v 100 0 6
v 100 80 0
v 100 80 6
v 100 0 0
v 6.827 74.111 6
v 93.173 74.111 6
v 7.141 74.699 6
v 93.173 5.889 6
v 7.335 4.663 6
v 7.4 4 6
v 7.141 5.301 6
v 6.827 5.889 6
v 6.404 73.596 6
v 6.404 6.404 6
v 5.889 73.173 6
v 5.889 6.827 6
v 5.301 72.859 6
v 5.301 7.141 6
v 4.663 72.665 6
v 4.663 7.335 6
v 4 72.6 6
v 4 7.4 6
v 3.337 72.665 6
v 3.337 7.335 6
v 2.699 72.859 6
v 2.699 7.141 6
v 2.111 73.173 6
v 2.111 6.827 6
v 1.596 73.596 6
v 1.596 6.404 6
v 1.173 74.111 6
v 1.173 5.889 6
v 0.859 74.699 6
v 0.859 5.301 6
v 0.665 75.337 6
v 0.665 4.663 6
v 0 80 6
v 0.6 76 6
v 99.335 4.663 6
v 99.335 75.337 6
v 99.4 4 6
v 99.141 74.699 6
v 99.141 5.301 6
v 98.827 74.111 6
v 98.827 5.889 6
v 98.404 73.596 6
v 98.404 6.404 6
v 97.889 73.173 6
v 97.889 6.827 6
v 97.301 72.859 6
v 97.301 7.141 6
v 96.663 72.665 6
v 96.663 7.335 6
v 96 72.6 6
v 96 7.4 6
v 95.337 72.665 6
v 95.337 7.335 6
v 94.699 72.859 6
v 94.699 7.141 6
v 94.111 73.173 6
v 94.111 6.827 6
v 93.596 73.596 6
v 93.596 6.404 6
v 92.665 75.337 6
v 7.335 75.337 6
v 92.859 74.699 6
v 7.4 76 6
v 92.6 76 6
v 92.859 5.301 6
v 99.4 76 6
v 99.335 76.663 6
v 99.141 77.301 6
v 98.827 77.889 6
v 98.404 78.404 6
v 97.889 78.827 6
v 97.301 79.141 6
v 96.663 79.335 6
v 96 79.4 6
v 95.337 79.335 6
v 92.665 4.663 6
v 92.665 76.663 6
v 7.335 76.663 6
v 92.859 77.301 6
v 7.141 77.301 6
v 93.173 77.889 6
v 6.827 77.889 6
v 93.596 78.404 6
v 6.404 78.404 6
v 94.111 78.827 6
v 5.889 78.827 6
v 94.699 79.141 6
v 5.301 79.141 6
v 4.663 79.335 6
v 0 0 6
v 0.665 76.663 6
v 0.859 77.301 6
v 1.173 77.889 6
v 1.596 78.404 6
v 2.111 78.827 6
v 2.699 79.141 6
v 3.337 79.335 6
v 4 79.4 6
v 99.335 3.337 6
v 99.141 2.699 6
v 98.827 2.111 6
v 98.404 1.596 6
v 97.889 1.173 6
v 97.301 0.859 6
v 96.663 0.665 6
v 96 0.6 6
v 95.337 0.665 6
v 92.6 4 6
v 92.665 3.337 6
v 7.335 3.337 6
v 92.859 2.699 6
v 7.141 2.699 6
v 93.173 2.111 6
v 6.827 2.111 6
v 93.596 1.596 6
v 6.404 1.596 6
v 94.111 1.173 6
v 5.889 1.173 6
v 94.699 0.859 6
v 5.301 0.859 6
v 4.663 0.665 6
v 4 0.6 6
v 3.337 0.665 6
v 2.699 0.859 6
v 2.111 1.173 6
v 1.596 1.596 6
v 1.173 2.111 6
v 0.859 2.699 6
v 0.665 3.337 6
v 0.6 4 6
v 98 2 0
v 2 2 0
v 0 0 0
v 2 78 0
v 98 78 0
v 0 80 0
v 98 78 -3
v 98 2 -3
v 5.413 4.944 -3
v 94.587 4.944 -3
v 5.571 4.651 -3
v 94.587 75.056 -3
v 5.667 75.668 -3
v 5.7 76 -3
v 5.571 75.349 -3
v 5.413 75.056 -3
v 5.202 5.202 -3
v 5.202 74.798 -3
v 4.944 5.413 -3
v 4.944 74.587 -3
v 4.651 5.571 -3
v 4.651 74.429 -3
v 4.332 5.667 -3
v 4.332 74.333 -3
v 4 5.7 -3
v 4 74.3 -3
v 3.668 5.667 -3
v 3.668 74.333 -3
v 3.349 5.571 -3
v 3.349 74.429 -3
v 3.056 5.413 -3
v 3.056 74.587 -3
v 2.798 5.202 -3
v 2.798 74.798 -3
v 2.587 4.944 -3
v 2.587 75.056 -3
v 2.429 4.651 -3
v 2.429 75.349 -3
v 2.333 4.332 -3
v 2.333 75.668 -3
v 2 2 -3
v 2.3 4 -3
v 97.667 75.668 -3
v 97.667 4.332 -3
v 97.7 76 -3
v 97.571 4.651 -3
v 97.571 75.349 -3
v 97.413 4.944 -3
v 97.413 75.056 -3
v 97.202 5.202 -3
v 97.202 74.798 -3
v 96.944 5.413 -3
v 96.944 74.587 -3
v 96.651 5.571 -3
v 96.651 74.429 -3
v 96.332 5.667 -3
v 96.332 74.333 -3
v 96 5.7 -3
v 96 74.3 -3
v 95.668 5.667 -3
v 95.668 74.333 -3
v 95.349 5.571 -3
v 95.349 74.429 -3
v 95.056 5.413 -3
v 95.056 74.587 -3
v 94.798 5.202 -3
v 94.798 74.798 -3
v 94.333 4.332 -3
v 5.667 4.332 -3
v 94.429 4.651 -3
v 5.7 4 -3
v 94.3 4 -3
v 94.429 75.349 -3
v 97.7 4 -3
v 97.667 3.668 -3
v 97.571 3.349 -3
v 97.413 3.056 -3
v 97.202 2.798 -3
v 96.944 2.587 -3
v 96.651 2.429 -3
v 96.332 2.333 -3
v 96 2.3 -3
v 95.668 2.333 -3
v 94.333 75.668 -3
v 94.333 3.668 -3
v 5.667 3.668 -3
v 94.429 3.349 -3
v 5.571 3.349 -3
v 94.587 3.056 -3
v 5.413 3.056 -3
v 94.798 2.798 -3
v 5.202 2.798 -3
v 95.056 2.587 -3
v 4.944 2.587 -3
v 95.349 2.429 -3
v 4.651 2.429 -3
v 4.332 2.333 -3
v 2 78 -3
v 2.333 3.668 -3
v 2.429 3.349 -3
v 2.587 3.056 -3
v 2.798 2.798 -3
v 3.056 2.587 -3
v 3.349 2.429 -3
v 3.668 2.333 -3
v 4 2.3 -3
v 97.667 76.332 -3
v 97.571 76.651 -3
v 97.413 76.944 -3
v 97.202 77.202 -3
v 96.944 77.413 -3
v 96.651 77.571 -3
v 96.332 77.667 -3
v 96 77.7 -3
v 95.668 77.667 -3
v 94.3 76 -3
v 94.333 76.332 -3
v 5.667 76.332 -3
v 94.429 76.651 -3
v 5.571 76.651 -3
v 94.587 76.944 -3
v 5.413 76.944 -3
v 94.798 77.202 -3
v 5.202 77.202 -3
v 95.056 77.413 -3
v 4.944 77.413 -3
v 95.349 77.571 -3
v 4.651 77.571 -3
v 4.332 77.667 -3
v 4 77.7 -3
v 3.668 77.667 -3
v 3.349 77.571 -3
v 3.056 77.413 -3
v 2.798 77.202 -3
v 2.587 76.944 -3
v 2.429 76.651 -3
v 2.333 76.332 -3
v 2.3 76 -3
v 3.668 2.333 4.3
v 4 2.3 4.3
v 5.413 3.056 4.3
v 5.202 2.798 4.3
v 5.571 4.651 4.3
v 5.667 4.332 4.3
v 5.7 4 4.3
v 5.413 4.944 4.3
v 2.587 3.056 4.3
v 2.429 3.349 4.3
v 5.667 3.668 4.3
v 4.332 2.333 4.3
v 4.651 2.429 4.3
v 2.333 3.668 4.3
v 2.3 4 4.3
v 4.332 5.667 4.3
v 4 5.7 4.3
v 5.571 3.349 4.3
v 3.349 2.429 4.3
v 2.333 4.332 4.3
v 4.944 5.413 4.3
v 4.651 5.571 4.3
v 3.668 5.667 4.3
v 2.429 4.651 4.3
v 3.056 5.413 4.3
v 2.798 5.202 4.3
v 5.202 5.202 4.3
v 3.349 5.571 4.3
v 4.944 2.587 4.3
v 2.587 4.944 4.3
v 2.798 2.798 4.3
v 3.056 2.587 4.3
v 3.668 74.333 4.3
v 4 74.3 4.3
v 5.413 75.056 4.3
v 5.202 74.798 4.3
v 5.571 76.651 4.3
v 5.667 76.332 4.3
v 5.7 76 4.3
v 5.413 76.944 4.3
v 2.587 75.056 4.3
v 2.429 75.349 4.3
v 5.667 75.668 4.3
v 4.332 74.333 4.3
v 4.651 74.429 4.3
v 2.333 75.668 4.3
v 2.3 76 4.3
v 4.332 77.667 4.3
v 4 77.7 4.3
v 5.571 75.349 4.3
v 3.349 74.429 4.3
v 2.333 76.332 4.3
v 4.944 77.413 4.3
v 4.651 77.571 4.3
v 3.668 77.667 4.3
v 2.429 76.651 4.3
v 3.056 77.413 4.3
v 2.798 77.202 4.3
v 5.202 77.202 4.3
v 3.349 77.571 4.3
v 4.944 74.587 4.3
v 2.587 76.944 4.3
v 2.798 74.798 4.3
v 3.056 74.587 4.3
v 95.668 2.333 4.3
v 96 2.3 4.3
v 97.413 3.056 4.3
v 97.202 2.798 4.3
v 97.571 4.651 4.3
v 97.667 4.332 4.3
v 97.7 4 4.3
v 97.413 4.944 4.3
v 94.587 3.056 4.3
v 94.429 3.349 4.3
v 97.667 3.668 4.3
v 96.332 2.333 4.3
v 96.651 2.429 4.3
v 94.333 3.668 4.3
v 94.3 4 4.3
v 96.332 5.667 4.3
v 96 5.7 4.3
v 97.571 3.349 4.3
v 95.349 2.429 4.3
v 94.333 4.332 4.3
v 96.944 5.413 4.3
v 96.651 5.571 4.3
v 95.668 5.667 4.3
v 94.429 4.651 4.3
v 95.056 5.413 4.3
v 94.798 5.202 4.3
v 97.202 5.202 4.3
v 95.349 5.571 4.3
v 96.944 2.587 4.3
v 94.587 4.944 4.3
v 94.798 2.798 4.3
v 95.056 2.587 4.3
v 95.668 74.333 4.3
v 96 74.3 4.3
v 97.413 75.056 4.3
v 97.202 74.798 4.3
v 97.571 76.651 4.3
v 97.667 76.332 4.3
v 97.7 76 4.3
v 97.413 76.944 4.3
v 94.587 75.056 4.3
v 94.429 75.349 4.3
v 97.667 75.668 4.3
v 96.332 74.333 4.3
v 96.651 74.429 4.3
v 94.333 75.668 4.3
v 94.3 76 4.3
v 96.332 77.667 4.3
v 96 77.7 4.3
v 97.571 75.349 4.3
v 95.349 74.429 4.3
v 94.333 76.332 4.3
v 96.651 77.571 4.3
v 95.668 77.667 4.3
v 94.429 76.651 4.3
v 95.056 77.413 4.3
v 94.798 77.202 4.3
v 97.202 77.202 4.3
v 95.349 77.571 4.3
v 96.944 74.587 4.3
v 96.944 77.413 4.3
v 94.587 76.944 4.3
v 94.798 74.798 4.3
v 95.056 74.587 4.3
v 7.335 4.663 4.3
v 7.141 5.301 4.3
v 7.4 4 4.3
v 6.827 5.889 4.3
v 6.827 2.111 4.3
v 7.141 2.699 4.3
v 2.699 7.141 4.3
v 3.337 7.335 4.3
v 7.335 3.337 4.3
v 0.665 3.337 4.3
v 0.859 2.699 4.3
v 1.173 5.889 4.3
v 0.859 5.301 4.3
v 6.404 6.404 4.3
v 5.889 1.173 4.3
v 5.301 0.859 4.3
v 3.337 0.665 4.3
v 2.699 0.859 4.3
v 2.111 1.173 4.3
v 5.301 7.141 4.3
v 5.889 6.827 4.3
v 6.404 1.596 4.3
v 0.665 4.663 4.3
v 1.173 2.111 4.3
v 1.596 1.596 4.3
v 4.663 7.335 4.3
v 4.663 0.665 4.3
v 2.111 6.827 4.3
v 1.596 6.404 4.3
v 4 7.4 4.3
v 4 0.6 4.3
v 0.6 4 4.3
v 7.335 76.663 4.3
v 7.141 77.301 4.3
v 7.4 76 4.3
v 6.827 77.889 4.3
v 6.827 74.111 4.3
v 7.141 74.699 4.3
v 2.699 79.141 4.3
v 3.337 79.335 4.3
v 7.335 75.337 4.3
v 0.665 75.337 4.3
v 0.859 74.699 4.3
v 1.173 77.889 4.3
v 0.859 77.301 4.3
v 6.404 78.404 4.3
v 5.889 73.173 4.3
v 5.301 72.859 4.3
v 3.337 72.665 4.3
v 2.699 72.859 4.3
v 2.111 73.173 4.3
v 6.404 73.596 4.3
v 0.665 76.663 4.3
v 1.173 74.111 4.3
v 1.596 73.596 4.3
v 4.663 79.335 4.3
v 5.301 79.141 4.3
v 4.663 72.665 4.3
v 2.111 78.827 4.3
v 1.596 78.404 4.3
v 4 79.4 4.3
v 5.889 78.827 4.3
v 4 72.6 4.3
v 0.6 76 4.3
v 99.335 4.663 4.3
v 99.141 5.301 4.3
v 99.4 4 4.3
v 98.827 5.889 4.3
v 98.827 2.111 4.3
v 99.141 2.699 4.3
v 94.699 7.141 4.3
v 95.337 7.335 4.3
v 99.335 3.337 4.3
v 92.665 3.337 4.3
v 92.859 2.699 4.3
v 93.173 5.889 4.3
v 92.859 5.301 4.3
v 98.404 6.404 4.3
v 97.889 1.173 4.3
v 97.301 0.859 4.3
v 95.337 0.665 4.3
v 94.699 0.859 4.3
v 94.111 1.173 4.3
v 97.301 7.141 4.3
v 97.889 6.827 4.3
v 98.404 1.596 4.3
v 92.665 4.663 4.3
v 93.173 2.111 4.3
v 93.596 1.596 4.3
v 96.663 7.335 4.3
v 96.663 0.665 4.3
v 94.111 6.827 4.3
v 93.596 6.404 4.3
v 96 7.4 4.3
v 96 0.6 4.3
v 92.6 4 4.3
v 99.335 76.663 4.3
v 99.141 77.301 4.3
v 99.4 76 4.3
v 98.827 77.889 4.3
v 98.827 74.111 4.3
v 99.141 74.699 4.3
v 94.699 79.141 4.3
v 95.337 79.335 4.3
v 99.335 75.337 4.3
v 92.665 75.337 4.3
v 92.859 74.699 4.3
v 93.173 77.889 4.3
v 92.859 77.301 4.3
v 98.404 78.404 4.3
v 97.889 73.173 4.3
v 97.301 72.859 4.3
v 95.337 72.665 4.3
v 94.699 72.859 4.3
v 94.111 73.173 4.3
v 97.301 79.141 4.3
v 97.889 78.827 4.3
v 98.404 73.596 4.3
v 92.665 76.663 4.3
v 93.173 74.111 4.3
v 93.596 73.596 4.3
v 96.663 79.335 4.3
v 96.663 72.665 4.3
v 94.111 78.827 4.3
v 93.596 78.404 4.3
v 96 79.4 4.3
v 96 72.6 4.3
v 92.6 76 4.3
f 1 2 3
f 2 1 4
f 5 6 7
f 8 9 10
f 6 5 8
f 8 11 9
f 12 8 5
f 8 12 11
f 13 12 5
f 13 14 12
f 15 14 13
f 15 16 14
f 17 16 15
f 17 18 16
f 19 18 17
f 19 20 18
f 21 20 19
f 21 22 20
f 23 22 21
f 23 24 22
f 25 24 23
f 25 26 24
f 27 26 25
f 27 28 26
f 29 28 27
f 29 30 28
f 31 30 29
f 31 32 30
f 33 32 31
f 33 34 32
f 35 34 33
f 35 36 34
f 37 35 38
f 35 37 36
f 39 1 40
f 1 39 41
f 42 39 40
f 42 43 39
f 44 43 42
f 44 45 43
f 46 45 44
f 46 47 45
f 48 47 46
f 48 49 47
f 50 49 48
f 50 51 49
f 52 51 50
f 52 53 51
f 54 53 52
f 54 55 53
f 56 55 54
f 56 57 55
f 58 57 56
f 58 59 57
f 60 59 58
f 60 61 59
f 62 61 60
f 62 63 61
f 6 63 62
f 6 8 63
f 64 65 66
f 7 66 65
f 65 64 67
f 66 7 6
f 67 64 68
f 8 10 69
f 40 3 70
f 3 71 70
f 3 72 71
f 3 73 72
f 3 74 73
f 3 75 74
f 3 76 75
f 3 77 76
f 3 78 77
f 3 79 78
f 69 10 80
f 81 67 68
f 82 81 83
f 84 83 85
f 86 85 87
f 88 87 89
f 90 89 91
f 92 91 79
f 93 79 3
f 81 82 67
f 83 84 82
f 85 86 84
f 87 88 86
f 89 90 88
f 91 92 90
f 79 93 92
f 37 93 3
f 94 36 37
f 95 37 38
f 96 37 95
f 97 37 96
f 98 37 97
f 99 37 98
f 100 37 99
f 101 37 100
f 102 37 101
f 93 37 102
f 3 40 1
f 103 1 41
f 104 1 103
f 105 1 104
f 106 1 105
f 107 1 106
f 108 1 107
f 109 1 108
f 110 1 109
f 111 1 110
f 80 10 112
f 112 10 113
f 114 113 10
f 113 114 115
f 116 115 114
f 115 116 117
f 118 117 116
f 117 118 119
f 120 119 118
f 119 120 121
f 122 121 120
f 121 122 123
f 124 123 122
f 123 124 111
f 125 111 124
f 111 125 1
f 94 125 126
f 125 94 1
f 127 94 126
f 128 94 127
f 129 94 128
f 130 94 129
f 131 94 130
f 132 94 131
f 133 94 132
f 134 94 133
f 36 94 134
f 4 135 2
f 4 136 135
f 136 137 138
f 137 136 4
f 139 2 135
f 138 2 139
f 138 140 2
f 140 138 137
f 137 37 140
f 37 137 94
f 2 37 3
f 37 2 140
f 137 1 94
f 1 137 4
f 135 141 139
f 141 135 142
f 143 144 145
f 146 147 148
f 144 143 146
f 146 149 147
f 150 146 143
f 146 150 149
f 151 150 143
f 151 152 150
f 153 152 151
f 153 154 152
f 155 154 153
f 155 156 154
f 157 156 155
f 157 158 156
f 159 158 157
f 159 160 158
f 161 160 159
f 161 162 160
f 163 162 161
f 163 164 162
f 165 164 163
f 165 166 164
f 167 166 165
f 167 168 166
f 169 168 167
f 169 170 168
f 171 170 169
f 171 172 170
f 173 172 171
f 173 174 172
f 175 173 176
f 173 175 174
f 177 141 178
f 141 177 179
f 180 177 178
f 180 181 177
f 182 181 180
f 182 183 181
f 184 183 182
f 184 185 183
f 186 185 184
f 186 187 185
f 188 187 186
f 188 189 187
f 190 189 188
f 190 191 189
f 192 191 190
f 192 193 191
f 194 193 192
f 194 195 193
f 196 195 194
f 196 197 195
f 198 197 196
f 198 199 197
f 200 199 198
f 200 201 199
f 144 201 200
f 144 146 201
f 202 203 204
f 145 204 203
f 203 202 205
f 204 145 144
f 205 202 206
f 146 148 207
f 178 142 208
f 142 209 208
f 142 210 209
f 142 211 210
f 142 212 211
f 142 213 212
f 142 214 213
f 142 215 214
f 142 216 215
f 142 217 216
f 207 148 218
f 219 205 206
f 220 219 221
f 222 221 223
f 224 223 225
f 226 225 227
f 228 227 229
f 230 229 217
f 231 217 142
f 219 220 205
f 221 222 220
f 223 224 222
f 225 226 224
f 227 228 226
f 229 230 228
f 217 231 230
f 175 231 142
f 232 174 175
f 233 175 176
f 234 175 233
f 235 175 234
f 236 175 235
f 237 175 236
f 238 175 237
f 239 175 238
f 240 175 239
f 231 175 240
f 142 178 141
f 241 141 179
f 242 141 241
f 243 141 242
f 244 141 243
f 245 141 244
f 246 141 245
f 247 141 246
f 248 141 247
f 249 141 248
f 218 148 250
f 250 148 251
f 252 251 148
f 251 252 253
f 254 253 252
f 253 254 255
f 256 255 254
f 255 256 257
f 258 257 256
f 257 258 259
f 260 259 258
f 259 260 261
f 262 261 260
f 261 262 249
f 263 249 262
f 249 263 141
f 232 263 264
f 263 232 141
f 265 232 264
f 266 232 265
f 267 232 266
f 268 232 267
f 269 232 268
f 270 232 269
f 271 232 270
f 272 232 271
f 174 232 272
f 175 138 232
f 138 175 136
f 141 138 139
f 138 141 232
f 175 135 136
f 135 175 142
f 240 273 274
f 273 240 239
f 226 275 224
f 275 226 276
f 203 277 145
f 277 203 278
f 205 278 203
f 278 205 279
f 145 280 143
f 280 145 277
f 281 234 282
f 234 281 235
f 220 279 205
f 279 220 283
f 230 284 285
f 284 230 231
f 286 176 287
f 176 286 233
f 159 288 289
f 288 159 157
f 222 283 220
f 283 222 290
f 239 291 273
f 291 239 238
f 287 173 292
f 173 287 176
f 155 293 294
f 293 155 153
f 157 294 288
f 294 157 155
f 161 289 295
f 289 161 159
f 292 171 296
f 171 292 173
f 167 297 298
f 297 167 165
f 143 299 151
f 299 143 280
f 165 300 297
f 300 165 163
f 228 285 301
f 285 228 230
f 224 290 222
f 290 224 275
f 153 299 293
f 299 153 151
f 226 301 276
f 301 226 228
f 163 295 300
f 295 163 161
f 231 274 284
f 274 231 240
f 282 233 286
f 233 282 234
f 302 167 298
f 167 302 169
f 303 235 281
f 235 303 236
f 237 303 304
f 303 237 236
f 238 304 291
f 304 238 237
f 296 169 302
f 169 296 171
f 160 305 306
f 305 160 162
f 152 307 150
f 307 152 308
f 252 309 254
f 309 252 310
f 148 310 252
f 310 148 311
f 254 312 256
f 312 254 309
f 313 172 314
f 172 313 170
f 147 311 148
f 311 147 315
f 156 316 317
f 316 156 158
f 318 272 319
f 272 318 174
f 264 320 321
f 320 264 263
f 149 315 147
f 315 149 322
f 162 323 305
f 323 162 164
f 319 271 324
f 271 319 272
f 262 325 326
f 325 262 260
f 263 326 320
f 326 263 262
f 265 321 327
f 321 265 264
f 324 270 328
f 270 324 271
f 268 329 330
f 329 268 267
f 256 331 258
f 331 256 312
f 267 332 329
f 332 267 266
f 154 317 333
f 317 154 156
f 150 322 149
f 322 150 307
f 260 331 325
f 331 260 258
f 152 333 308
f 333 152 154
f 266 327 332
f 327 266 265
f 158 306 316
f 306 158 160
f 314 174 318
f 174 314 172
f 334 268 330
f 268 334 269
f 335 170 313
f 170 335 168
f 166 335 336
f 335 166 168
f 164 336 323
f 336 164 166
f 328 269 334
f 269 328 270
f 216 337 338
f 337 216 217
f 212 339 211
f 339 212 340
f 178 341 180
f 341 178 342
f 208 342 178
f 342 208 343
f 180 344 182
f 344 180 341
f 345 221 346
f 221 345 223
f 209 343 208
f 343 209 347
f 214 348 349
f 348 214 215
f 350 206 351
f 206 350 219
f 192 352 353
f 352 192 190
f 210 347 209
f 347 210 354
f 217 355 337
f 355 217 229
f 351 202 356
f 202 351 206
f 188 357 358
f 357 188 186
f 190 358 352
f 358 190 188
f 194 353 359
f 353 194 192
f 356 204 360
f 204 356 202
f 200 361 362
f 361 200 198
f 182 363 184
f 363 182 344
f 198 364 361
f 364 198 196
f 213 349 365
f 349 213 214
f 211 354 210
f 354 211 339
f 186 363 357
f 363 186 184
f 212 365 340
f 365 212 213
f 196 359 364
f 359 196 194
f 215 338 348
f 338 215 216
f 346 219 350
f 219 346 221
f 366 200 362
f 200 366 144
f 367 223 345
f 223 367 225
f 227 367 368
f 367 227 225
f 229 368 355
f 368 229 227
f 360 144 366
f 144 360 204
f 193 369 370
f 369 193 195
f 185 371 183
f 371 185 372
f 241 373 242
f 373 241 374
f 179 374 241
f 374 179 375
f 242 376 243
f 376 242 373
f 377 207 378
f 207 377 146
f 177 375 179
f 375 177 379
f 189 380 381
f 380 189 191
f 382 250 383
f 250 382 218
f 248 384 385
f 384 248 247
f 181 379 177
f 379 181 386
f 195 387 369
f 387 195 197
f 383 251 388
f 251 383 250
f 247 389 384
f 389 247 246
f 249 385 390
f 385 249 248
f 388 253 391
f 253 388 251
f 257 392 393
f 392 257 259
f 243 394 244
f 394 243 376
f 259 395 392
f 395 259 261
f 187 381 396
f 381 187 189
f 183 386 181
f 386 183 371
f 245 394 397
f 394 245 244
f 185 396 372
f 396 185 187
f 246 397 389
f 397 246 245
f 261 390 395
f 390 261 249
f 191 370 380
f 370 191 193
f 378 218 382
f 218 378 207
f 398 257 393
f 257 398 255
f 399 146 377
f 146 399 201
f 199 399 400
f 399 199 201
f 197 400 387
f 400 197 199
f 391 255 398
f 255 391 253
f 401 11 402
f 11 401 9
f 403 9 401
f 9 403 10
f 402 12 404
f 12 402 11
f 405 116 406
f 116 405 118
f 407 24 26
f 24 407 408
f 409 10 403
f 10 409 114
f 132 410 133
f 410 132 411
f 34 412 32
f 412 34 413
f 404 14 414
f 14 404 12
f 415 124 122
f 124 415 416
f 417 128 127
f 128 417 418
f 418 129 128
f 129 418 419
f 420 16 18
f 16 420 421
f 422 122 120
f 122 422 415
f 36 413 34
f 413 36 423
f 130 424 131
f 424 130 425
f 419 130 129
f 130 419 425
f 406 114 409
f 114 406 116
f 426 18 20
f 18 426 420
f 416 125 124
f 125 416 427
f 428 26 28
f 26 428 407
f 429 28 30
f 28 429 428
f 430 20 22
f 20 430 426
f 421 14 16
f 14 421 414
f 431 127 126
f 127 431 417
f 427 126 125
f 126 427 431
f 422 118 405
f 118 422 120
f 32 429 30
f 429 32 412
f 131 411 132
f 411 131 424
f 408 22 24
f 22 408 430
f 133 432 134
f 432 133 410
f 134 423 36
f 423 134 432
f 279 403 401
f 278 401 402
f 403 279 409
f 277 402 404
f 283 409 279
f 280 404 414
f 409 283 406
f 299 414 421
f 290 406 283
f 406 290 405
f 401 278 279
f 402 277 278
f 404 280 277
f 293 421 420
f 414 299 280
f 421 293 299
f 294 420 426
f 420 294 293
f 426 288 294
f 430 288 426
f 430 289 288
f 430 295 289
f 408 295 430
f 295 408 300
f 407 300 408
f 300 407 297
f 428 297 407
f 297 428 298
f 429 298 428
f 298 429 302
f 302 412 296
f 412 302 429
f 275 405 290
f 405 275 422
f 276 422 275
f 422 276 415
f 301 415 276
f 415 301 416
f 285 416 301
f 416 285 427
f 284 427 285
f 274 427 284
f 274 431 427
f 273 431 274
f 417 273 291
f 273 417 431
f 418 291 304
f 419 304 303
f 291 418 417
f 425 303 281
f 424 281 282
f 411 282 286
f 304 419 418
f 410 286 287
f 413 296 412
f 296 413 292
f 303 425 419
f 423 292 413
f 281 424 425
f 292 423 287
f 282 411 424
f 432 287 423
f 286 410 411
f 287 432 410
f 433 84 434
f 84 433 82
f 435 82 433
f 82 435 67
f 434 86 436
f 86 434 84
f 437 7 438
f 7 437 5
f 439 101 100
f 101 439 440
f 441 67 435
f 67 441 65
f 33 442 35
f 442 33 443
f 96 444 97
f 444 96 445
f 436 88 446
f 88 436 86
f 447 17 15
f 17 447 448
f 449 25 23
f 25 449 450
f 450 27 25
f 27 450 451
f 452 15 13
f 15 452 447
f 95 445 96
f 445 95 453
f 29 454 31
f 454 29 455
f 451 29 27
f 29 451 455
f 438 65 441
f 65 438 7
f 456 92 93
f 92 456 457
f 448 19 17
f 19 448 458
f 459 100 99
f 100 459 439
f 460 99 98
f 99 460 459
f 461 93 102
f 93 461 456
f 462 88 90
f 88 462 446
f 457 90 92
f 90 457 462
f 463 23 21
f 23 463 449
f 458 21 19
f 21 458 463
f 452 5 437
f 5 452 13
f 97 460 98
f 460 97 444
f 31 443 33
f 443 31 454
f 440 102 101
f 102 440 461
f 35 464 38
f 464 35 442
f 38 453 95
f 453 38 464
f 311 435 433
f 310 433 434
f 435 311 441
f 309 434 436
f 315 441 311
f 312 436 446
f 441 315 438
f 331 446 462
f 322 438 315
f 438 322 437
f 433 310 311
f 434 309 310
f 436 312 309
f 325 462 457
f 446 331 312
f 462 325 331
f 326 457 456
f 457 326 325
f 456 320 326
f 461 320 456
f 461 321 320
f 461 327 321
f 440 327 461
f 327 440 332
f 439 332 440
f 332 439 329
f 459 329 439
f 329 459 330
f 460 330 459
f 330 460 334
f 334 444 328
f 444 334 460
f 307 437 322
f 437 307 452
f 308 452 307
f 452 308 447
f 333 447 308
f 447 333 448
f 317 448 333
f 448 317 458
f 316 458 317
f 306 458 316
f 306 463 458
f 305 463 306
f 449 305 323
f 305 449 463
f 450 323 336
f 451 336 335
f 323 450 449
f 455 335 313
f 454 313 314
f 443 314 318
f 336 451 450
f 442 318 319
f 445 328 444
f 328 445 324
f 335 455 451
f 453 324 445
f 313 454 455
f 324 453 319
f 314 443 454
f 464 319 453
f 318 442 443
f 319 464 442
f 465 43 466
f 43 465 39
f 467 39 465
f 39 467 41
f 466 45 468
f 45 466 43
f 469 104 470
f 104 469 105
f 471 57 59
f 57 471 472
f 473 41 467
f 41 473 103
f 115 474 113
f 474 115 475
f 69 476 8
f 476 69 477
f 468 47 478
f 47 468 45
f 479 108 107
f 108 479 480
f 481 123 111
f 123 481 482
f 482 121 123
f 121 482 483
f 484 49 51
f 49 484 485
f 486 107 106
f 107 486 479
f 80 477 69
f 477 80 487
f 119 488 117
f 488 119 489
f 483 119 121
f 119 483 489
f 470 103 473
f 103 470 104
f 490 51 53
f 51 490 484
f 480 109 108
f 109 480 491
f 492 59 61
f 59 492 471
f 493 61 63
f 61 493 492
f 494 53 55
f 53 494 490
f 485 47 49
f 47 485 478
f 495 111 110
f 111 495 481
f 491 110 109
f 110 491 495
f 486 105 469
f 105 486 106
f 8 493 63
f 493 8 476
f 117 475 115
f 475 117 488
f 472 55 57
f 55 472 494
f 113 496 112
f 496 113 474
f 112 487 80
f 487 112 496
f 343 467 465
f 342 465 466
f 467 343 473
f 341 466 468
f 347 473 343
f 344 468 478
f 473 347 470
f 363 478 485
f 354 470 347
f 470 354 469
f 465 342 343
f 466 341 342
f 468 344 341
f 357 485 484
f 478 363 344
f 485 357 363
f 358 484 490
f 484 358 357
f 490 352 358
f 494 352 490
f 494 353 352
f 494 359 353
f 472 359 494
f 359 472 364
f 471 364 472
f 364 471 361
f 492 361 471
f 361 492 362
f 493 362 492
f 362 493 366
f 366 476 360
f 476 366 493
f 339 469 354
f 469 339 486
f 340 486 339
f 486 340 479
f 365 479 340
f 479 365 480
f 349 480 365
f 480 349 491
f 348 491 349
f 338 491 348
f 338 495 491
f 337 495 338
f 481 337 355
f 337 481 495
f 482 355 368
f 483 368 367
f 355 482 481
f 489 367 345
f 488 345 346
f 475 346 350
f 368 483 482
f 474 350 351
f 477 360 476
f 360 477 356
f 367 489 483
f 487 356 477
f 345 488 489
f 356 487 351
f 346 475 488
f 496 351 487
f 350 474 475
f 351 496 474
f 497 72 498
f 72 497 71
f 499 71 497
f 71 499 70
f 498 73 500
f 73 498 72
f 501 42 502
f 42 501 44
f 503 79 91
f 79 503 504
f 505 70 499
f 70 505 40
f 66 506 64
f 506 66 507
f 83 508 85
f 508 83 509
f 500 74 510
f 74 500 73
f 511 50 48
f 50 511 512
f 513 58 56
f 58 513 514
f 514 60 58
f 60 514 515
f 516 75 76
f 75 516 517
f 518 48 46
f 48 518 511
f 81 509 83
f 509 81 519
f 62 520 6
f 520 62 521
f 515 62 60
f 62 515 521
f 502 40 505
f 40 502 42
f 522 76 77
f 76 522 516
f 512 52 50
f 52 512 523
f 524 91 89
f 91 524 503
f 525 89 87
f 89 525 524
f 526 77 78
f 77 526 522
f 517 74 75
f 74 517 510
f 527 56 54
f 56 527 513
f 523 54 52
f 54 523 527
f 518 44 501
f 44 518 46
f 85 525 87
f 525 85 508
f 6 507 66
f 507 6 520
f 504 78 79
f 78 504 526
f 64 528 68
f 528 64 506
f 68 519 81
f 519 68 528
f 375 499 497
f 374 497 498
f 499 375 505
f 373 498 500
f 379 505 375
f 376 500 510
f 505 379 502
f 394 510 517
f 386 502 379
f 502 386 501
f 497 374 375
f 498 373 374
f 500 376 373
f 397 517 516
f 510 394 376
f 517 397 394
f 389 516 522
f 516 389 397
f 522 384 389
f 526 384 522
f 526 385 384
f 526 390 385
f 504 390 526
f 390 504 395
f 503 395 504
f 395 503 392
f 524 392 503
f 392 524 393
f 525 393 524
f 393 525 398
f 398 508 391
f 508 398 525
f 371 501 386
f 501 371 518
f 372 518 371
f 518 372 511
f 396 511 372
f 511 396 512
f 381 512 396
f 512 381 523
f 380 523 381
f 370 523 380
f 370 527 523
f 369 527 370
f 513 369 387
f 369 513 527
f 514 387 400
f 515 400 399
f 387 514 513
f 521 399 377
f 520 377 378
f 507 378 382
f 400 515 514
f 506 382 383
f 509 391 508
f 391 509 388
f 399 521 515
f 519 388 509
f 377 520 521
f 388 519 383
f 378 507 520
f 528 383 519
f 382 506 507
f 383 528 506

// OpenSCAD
$fn = 32;

// ----------------------------------------------------------------------
// Enclosure lid: 100 x 80 x 6 mm, 4 bolt holes
// ----------------------------------------------------------------------

// --- parameters (mm) ---
length = 100;             // lid length, X
width = 80;               // lid width, Y
plate_t = 6;              // lid plate thickness
bolt_d = 3.4;             // bolt clearance
boss_lip = 4;             // bolt hole inset from the corner
sink = 1;                 // overlap of the lip and ribs into the plate
lip_h = 4;                // lip height below the plate
lip_wall = 2;             // lip wall thickness
cs_d = 6.8;               // countersink diameter
cs_h = 1.7;               // countersink depth

module plate() {
  cube([length, width, plate_t]);
  /* lip that drops into the housing opening, sunk into the plate */
  translate([lip_wall, lip_wall, -lip_h + sink]) cube([length - 2 * lip_wall, width - 2 * lip_wall, lip_h]);
}

difference() {
  plate();
  /* bolt pattern matching the corner bosses */
  for (sx = [0, 1]) for (sy = [0, 1])
    translate([sx * (length - 2 * boss_lip) + boss_lip, sy * (width - 2 * boss_lip) + boss_lip, -lip_h - 1])
      cylinder(h = plate_t + lip_h + 2, d = bolt_d);
  /* countersinks so the heads sit flush */
  for (sx = [0, 1]) for (sy = [0, 1])
    translate([sx * (length - 2 * boss_lip) + boss_lip, sy * (width - 2 * boss_lip) + boss_lip, plate_t - cs_h])
      cylinder(h = cs_h + 0.5, d = cs_d);
}
